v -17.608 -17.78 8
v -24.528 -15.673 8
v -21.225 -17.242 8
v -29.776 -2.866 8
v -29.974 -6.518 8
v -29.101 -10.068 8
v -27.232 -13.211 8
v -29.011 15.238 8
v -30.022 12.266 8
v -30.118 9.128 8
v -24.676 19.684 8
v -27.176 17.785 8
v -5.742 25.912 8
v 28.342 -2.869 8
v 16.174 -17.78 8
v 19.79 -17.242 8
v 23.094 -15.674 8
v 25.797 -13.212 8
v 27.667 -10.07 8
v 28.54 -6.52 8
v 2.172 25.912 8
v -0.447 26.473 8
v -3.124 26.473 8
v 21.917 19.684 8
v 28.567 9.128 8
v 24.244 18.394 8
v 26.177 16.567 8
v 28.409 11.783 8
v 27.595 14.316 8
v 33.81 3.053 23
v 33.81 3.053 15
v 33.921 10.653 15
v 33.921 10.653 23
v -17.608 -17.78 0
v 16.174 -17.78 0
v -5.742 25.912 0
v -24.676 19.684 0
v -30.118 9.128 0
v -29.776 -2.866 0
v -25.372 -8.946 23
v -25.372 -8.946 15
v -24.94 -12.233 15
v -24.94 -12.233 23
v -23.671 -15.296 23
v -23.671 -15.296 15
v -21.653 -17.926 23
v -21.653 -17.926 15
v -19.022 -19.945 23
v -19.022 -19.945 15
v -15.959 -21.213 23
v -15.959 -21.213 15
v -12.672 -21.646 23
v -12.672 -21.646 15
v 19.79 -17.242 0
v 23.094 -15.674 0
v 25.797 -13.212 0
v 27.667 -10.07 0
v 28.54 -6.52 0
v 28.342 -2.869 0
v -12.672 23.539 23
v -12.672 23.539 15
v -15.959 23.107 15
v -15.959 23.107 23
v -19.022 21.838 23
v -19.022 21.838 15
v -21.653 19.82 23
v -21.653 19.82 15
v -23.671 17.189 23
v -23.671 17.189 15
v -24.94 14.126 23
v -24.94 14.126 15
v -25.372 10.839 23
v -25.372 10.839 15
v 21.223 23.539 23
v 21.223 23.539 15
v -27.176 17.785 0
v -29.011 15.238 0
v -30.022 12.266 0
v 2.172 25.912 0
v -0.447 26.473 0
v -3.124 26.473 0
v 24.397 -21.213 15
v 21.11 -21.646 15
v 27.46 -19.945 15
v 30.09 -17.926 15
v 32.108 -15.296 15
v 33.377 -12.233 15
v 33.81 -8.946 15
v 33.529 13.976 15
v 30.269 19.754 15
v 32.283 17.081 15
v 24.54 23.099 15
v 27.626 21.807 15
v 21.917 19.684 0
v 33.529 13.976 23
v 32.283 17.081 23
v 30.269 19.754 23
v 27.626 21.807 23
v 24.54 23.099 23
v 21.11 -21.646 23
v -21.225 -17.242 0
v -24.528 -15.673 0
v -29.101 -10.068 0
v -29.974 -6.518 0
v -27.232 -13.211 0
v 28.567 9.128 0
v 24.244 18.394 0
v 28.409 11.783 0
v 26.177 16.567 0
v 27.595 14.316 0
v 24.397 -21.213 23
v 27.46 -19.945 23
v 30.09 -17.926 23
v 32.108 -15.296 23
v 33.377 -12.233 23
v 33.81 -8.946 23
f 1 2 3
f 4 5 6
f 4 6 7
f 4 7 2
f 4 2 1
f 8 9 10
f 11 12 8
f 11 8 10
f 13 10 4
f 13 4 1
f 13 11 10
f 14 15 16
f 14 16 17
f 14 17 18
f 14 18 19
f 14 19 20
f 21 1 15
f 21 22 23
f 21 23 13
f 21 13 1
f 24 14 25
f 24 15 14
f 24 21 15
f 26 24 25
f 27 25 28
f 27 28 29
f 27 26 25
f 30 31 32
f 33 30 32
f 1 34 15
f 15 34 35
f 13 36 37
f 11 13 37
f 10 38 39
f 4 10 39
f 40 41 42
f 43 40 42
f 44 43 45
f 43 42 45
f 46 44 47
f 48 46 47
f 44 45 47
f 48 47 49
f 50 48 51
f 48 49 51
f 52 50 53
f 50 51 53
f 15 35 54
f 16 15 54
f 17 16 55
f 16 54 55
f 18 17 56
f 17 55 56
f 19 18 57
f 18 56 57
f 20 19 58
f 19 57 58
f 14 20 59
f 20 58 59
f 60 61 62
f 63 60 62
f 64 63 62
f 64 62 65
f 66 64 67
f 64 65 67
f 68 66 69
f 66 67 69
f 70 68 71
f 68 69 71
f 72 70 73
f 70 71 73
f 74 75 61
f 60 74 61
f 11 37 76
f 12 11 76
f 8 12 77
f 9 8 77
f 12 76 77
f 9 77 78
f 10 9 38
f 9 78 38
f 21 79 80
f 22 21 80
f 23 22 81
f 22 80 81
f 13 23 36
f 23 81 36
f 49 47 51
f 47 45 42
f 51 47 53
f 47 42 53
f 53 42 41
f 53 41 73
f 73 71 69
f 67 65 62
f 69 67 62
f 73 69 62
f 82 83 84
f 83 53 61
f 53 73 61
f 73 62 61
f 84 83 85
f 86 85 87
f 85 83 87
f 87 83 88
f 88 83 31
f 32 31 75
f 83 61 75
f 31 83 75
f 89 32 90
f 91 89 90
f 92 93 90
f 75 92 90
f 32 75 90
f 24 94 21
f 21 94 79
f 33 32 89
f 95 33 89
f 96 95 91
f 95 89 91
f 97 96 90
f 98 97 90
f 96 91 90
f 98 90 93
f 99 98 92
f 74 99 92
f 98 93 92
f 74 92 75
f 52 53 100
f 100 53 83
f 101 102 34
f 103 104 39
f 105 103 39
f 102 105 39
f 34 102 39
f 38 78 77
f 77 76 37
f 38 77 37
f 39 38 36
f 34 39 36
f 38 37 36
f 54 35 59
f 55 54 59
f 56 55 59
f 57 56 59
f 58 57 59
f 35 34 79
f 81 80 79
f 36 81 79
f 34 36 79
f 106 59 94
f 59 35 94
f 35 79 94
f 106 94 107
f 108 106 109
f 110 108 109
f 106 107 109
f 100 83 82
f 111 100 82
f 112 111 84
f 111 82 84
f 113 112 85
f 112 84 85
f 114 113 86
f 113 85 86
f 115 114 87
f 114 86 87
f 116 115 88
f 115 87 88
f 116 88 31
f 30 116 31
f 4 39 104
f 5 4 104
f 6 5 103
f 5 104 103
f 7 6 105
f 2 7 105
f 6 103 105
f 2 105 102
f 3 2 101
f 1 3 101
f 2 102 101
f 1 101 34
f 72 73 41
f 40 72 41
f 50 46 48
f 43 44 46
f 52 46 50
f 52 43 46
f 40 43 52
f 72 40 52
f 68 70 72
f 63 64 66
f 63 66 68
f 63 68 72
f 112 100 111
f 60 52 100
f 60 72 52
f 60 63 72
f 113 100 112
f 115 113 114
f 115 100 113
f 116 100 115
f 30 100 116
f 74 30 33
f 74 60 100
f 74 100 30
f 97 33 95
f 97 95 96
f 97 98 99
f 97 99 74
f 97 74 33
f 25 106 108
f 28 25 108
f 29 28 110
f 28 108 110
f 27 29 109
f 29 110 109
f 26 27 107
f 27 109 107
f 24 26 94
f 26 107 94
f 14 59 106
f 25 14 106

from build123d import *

# Parameters (mm, degrees)
F1_DEPTH = 8
F4_DEPTH = 8


with BuildPart() as f1:
    # F0 (on Top) → F1 (new body)
    with BuildSketch(Plane.XY):
        with BuildLine():
            Line((-17.608003, -17.78), (16.173997, -17.78))
            ThreePointArc((16.173997, -17.78), (25.796989, -13.212383), (28.342361, -2.868971))
            Line((28.342361, -2.868971), (28.567445, 9.127986))
            ThreePointArc((28.567445, 9.127986), (26.956623, 15.485972), (21.91684, 19.683511))
            Line((21.91684, 19.683511), (2.171596, 25.911591))
            ThreePointArc((2.171596, 25.911591), (-1.78544, 26.543789), (-5.742477, 25.911591))
            Line((-5.742477, 25.911591), (-24.675893, 19.683511))
            ThreePointArc((-24.675893, 19.683511), (-29.011473, 15.238116), (-30.11832, 9.127986))
            Line((-30.11832, 9.127986), (-29.775796, -2.866186))
            ThreePointArc((-29.775796, -2.866186), (-27.231893, -13.211282), (-17.608003, -17.78))
        make_face()
    extrude(amount=F1_DEPTH)


with BuildPart() as f4:
    # F3 (on offset) → F4 (new body)
    with BuildSketch(Plane.XY.offset(15)):
        with BuildLine():
            Line((-12.672412, -21.645996), (21.109588, -21.645996))
            ThreePointArc((21.109588, -21.645996), (30.089845, -17.926252), (33.809588, -8.945996))
            Line((33.809588, -8.945996), (33.809588, 3.053065))
            Line((33.809588, 3.053065), (33.921308, 10.65282))
            ThreePointArc((33.921308, 10.65282), (30.268696, 19.753508), (21.22268, 23.539496))
            Line((21.22268, 23.539496), (3.957036, 23.539496))
            Line((3.957036, 23.539496), (-3.957036, 23.539496))
            Line((-3.957036, 23.539496), (-12.672412, 23.539496))
            ThreePointArc((-12.672412, 23.539496), (-21.652668, 19.819752), (-25.372412, 10.839496))
            Line((-25.372412, 10.839496), (-25.372412, 3.053065))
            Line((-25.372412, 3.053065), (-25.372412, -8.945996))
            ThreePointArc((-25.372412, -8.945996), (-21.652668, -17.926252), (-12.672412, -21.645996))
        make_face()
    extrude(amount=F4_DEPTH)


solid = Compound([f1.part, f4.part])
